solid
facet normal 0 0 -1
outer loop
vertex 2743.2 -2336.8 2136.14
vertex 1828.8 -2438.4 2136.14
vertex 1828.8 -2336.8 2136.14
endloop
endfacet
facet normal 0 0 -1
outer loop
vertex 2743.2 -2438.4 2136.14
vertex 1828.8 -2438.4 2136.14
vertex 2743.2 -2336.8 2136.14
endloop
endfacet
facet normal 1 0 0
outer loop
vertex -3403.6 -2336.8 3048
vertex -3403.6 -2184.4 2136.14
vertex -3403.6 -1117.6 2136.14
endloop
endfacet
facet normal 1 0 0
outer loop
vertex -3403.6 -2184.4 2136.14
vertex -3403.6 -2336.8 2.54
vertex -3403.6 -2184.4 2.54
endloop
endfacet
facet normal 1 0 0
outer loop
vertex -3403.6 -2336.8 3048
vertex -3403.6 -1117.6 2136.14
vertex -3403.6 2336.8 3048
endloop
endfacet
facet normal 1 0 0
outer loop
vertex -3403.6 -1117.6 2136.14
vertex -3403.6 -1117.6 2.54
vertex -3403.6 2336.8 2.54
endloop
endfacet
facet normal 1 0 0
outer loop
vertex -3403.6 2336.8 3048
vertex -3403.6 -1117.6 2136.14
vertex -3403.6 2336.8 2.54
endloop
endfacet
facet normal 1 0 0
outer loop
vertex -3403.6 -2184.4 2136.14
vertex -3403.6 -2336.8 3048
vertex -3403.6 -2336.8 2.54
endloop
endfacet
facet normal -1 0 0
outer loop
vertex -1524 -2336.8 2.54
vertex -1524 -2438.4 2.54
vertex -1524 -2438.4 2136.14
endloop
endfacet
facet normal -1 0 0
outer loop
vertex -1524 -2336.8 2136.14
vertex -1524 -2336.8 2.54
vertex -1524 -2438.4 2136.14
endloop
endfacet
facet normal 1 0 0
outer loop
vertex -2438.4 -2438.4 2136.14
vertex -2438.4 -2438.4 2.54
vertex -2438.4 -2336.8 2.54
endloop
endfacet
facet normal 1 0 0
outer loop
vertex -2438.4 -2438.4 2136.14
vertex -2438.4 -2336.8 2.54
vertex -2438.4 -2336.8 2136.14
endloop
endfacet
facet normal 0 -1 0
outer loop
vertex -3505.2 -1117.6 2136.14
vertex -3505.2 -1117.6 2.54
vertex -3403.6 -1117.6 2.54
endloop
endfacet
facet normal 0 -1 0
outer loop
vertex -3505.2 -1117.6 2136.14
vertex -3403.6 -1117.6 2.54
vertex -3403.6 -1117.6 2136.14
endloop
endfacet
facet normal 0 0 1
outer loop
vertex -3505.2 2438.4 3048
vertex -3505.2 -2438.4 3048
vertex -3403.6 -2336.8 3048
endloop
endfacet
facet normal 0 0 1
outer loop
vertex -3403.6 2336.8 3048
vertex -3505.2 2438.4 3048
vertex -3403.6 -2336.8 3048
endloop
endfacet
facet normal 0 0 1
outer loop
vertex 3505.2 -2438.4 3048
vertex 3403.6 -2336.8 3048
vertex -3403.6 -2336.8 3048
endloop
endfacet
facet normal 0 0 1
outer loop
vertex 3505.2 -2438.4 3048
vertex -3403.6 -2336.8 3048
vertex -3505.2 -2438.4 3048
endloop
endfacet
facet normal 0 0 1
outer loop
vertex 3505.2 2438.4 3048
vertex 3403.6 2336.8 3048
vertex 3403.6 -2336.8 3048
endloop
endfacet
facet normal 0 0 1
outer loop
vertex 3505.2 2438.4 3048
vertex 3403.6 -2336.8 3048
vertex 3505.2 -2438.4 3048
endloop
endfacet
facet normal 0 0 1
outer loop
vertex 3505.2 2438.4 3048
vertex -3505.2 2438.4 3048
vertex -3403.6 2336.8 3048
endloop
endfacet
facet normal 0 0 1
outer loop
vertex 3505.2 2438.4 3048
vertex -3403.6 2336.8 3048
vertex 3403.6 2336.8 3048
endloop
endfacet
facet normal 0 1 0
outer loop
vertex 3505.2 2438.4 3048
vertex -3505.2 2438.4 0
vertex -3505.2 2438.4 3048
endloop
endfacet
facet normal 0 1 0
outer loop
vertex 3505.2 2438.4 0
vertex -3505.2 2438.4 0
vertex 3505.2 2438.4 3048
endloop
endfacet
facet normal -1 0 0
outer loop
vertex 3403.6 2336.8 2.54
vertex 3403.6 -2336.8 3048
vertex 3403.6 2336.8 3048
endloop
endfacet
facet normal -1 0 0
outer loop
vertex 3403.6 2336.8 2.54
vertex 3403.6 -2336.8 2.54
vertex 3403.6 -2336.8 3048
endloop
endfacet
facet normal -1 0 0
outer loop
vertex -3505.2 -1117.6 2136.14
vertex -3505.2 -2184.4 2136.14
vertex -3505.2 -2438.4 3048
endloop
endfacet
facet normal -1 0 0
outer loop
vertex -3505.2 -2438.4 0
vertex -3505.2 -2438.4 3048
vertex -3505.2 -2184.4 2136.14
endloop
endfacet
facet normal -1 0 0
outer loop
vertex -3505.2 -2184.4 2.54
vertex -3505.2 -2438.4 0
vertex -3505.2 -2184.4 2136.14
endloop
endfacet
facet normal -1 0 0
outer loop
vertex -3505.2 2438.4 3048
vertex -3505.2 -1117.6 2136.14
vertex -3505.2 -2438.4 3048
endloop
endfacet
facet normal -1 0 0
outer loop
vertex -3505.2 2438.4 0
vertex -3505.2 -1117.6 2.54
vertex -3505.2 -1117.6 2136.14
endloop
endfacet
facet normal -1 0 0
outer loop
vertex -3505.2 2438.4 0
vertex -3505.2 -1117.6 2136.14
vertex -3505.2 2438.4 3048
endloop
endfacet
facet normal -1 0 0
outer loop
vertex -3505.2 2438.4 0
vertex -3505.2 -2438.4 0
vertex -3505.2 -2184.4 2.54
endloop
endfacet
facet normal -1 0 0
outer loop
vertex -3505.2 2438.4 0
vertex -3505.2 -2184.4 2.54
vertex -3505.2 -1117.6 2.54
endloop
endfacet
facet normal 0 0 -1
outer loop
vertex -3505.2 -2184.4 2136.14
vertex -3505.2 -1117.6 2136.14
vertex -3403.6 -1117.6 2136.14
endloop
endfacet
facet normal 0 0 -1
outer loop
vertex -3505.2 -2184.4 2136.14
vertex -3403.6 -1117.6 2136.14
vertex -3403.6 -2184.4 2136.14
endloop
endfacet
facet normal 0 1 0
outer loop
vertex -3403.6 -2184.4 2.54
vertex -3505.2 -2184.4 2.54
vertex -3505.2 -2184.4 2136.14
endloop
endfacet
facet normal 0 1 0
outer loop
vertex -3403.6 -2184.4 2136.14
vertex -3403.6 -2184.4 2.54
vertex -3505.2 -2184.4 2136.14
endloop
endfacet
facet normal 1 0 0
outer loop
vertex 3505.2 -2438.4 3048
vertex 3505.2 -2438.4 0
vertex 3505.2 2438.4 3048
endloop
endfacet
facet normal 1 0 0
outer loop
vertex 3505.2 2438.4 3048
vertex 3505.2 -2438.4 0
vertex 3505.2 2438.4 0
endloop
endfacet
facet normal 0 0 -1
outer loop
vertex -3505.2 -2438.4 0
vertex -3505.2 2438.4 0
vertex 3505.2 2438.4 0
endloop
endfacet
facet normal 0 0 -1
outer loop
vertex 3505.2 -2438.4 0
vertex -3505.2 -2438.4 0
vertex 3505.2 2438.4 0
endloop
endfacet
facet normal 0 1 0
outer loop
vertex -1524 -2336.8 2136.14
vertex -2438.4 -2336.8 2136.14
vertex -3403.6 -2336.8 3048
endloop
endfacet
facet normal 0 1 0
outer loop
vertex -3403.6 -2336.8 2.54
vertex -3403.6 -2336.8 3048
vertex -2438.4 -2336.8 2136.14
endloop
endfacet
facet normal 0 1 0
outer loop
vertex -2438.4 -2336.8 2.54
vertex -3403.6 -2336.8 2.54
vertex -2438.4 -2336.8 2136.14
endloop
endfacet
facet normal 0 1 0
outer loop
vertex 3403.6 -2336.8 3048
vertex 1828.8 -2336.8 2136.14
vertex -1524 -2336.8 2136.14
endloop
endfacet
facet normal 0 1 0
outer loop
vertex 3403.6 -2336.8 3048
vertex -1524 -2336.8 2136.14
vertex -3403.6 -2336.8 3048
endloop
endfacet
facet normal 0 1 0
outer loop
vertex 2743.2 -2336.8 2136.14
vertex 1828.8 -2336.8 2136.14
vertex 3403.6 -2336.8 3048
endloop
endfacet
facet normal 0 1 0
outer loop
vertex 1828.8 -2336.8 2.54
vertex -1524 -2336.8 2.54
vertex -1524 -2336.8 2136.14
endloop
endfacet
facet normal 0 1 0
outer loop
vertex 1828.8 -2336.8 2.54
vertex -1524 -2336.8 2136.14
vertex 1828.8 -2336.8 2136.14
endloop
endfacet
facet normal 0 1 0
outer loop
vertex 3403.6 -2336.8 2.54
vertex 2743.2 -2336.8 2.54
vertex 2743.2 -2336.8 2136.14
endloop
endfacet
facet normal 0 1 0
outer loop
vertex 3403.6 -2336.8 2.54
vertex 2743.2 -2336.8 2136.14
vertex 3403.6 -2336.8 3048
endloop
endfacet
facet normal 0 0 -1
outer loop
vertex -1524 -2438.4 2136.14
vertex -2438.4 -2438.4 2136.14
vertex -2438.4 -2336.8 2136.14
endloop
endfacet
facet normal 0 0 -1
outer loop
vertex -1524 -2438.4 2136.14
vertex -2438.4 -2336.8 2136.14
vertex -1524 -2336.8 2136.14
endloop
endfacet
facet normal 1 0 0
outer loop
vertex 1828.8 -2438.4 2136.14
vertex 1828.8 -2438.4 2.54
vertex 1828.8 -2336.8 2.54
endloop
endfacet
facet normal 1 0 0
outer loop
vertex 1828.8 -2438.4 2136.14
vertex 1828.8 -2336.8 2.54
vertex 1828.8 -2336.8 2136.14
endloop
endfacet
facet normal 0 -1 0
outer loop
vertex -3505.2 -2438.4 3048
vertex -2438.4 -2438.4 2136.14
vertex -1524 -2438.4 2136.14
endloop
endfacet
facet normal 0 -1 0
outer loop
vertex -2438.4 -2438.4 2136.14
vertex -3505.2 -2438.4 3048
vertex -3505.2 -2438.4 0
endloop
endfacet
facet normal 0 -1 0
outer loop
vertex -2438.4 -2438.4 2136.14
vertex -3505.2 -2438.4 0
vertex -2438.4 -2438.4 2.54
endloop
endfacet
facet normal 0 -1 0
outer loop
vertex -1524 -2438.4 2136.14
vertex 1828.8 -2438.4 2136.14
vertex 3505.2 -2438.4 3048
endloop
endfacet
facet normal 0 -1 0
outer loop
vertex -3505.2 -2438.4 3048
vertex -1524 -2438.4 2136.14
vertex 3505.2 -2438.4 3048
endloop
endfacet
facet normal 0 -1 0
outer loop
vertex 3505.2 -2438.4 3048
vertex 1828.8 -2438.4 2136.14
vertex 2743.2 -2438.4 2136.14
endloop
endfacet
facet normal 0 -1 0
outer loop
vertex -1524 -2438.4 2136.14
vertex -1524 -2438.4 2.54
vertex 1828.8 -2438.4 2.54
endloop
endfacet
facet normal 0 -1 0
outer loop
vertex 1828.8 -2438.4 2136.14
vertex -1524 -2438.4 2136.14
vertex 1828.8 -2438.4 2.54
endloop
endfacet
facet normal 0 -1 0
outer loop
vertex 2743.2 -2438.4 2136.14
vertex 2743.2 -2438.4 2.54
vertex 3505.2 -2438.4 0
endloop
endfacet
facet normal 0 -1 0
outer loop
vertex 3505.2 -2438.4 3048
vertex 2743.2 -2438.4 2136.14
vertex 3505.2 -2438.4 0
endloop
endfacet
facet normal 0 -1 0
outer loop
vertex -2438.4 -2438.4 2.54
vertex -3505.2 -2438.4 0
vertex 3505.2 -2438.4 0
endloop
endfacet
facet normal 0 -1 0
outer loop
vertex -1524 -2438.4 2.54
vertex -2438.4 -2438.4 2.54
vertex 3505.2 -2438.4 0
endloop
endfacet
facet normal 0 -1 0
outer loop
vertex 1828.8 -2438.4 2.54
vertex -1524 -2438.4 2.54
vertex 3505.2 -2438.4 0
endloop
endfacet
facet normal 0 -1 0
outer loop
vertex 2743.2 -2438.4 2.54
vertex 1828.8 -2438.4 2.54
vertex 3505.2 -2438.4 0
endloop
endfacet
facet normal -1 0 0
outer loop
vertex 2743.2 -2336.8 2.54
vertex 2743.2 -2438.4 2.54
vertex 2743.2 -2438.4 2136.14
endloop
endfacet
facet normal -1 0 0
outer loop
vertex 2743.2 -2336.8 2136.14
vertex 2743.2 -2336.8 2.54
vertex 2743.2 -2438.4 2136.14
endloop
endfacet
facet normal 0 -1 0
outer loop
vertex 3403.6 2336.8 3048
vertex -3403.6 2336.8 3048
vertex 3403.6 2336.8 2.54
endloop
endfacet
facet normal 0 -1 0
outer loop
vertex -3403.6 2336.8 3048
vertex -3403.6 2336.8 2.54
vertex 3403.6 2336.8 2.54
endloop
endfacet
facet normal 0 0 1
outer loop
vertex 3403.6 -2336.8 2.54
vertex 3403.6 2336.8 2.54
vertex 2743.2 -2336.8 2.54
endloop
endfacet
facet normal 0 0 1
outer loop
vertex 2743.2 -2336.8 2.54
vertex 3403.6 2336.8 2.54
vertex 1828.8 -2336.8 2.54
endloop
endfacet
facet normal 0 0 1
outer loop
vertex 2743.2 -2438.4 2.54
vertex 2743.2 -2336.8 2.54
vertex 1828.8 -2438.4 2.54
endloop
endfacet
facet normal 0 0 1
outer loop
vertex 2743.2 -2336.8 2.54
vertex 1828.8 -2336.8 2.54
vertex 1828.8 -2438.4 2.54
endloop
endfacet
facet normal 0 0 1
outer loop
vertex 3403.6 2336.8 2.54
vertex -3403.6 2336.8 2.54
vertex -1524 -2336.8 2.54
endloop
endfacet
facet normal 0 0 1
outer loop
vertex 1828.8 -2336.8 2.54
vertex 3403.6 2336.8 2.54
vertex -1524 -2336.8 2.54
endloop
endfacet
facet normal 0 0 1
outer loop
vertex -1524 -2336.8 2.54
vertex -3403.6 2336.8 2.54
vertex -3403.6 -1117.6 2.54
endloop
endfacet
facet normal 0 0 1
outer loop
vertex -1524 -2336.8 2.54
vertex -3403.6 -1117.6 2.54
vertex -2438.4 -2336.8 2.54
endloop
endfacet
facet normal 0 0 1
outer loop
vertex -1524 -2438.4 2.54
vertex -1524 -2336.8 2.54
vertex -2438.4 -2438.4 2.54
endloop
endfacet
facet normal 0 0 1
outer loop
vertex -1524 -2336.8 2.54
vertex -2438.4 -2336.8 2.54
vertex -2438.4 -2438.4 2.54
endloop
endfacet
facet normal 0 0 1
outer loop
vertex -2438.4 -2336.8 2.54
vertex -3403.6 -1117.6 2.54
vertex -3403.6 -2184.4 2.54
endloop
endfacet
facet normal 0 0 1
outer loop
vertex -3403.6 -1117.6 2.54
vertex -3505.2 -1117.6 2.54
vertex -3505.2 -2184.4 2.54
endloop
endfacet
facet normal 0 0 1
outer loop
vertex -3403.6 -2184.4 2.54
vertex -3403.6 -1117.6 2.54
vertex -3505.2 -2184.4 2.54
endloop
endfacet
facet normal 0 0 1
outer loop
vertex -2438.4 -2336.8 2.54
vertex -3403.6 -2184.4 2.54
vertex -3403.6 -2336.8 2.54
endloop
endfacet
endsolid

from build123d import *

# Parameters (mm, degrees)
F0_W     = 7010.4
F0_H     = 4876.8
F1_DEPTH = 3048
F2_T     = -101.6
F3_W     = 914.4
F3_H     = 2133.6
F4_DEPTH = 101.6
F5_DEPTH = 99.06
F6_W     = 1066.8
F6_H     = 2133.6
F7_DEPTH = 101.6


with BuildPart() as f1:
    # F0 (on Top) → F1 (new body)
    with BuildSketch(Plane.XY):
        Rectangle(F0_W, F0_H)
    extrude(amount=F1_DEPTH)

    # F2
    f2_openings = [f1.faces().sort_by_distance(p)[0] for p in [
        (0, 0, 3048),
    ]]
    offset(amount=F2_T, openings=f2_openings)

    # F3 (on face) → F4 (cut)
    with BuildSketch(Plane.XZ.offset(2438.4)):
        with Locations((-1981.2, 1069.34)):
            Rectangle(F3_W, F3_H)
        with Locations((2286, 1069.34)):
            Rectangle(F3_W, F3_H)
    extrude(amount=-F4_DEPTH, mode=Mode.SUBTRACT)

    # F5 (cut): a face of the model
    f5_faces = [f1.faces().sort_by_distance(p)[0] for p in [
        (0, 0, 101.6),
    ]]
    extrude(f5_faces, amount=-F5_DEPTH, mode=Mode.SUBTRACT)

    # F6 (on face) → F7 (cut)
    with BuildSketch(Plane(origin=(-3505.2, 0, 0), x_dir=(0, -1, 0), z_dir=(-1, 0, 0))):
        with Locations((1651, 1069.34)):
            Rectangle(F6_W, F6_H)
    extrude(amount=-F7_DEPTH, mode=Mode.SUBTRACT)


solid = f1.part
